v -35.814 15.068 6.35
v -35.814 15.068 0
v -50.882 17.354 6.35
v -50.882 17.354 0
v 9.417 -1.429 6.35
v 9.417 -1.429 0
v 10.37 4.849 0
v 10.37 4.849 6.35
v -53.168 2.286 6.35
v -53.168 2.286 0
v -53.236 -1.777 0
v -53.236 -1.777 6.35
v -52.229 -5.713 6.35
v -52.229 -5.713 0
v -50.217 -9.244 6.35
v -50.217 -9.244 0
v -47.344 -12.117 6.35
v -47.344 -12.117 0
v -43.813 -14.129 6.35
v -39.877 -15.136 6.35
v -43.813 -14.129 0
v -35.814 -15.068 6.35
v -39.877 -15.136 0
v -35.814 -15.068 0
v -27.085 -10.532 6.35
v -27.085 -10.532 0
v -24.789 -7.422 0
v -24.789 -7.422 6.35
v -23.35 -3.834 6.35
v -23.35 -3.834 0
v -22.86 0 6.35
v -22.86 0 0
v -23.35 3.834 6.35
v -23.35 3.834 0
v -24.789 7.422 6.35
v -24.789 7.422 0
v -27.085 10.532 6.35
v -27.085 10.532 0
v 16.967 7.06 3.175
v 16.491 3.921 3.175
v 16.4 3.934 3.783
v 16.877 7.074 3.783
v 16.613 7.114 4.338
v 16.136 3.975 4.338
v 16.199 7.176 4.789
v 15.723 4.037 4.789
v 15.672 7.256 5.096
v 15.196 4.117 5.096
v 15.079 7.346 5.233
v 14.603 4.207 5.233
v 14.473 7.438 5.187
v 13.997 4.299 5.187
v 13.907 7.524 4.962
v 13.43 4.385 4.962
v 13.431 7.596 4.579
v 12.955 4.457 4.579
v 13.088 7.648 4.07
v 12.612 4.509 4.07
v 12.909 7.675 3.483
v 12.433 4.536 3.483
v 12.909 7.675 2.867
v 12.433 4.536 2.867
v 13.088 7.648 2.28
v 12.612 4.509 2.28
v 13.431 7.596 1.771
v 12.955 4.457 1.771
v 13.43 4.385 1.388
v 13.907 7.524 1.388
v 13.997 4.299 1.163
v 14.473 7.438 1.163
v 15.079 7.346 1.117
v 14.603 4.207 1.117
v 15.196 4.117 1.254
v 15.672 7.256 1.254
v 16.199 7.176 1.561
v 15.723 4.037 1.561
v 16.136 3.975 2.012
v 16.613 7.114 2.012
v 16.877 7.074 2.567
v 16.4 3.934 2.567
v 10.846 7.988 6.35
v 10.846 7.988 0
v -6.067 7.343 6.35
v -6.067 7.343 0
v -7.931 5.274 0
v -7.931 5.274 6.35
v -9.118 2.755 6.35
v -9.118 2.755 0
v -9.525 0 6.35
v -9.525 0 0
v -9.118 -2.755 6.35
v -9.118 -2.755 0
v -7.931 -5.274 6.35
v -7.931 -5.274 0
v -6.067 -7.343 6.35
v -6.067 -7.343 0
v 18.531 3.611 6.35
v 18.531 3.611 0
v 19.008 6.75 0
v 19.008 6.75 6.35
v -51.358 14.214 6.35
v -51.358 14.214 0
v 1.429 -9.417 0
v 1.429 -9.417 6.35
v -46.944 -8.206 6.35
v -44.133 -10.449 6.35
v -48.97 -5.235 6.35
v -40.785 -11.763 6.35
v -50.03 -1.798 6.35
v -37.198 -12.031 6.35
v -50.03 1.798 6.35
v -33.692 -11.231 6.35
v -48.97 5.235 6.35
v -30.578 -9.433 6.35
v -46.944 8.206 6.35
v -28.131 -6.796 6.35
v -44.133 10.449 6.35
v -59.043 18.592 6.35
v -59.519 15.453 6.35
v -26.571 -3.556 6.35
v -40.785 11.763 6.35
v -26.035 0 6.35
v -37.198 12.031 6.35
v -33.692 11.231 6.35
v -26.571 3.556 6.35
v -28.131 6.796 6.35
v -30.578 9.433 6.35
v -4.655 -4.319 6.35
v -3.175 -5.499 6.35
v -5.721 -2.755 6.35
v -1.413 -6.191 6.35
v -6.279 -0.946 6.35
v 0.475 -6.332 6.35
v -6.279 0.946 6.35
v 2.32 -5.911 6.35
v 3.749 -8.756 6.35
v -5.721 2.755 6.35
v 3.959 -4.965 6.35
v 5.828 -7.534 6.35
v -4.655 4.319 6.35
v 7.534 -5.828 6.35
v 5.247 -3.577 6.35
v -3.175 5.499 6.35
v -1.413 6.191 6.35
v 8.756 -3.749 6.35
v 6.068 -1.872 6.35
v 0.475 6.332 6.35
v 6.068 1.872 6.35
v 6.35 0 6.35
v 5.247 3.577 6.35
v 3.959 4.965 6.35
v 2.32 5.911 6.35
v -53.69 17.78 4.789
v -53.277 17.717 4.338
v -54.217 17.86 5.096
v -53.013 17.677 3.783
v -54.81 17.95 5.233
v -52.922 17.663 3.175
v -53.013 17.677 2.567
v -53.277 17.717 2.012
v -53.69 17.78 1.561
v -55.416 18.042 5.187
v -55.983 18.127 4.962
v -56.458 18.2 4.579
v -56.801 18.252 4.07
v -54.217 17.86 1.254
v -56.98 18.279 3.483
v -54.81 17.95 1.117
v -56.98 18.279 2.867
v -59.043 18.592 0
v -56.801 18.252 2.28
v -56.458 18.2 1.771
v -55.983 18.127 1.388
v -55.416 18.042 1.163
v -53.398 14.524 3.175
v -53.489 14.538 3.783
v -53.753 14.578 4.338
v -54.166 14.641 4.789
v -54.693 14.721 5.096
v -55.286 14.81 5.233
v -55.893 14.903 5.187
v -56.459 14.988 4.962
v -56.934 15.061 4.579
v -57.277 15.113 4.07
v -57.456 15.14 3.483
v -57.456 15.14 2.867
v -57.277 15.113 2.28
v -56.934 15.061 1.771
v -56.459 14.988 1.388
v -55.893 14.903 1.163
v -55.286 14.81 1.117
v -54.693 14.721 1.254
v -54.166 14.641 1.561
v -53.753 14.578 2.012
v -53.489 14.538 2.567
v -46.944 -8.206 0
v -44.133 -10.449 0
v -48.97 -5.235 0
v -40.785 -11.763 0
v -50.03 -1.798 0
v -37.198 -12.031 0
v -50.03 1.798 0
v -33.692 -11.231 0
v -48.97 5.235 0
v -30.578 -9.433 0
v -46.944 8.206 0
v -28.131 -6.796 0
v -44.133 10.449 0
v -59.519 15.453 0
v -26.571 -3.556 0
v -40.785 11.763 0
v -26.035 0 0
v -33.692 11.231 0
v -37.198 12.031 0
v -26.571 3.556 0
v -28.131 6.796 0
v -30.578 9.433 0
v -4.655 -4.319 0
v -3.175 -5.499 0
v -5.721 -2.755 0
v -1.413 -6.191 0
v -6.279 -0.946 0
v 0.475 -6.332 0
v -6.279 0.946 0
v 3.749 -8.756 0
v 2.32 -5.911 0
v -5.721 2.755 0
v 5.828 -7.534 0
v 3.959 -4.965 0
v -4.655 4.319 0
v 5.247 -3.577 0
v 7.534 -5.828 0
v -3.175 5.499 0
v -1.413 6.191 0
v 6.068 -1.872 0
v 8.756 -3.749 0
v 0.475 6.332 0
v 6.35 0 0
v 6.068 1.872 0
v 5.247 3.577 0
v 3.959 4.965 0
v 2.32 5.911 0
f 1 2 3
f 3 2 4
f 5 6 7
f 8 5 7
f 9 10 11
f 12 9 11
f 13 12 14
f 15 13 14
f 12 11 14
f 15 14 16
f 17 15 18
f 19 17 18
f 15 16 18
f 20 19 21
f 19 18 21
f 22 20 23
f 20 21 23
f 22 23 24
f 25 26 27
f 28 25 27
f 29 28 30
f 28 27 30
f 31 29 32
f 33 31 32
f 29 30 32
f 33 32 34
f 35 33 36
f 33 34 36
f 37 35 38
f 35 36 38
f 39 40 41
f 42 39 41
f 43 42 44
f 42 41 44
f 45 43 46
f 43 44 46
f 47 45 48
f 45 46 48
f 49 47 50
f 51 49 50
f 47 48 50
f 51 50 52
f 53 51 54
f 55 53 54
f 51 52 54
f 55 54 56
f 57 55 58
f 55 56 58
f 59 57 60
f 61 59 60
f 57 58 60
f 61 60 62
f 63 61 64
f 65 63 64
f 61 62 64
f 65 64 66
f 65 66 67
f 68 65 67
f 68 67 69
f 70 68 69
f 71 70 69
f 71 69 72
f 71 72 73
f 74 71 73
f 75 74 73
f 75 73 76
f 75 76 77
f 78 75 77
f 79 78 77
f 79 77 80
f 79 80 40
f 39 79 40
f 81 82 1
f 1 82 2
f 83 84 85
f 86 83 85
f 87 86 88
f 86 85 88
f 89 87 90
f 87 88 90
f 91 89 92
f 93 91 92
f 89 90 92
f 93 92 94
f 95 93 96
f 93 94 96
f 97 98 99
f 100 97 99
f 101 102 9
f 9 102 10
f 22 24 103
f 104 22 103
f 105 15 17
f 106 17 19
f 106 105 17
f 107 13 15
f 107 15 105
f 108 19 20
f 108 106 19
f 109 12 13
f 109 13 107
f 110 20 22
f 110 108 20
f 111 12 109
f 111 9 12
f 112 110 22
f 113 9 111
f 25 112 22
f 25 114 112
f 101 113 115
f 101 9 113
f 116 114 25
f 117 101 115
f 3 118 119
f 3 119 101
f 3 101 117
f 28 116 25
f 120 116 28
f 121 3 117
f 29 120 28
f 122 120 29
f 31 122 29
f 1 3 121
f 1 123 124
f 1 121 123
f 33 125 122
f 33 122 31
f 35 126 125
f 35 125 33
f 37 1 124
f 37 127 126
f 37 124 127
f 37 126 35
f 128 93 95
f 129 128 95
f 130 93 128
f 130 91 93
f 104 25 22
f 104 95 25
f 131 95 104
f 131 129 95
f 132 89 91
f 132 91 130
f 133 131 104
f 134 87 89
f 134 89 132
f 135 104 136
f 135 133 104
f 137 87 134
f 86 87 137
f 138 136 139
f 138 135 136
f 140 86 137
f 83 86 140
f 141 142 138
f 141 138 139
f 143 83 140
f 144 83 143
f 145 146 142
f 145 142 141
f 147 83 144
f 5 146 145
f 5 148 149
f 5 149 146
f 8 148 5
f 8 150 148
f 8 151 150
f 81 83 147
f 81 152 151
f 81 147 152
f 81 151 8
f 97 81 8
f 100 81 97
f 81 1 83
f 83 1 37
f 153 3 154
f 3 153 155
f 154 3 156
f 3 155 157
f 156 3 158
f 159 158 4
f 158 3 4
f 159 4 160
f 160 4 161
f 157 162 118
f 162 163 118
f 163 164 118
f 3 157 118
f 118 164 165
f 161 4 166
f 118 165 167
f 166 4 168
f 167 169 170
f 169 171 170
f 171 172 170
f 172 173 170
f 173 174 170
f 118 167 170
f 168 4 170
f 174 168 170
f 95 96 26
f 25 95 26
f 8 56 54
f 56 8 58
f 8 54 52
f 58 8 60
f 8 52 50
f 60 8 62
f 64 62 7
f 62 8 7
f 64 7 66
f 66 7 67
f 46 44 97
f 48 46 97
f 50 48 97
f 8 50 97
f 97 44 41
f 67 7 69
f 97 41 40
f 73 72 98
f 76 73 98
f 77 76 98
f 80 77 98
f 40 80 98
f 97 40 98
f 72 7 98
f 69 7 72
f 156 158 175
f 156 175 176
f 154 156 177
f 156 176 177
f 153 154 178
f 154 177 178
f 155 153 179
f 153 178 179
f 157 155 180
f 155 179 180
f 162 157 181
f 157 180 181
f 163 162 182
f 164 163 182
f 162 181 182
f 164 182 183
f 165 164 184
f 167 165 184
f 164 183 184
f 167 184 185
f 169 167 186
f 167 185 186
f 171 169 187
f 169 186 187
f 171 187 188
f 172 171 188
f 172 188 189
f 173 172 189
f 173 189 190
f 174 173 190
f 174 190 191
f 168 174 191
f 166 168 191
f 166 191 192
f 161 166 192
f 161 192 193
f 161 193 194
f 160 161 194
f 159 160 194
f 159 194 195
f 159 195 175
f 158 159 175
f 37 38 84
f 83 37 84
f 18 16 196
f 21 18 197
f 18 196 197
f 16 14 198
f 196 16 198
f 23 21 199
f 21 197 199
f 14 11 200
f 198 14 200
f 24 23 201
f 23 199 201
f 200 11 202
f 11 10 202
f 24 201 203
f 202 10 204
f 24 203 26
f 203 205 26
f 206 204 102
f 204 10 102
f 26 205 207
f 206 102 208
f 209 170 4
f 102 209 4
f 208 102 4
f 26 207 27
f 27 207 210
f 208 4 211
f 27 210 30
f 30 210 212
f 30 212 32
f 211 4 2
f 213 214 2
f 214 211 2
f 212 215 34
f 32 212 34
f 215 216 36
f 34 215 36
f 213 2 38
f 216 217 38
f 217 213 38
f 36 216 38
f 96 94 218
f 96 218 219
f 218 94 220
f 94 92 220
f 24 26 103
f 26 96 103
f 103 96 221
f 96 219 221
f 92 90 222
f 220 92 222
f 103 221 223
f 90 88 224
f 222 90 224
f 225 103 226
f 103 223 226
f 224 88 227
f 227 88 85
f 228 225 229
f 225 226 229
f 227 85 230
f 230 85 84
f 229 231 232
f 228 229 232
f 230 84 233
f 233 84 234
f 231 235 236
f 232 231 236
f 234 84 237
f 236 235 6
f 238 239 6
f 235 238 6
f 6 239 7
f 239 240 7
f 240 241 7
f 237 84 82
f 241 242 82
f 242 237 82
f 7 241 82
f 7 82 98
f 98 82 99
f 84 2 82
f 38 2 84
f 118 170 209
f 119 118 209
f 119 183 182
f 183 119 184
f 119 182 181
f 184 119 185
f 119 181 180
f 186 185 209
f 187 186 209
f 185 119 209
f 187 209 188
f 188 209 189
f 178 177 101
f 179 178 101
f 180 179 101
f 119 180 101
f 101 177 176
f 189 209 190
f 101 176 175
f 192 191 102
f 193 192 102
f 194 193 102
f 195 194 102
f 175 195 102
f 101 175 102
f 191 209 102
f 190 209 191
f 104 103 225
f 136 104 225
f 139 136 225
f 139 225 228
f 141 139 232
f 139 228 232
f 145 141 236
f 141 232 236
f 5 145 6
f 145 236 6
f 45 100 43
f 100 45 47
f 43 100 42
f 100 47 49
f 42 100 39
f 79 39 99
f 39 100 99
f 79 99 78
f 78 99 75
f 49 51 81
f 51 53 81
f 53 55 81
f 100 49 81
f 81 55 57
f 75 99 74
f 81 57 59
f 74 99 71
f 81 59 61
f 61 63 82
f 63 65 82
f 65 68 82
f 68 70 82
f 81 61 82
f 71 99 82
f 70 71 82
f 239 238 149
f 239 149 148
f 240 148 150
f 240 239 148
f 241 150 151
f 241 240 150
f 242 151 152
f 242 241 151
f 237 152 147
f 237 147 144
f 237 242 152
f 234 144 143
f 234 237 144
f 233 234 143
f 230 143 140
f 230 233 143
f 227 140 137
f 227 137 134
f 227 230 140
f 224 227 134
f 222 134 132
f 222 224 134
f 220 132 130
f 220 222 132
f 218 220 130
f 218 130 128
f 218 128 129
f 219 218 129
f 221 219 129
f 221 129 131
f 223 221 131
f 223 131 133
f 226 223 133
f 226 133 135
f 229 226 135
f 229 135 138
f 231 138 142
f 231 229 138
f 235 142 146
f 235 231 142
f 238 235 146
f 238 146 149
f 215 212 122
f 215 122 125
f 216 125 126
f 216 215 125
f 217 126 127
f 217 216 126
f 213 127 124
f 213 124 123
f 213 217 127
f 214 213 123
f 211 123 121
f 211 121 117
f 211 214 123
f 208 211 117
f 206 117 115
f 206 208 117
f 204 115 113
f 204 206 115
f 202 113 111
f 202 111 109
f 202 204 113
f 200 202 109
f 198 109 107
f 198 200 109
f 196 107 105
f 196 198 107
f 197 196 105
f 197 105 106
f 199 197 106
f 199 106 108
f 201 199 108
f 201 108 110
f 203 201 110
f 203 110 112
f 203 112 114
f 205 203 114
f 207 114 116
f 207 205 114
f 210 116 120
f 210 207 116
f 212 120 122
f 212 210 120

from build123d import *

# Parameters (mm, degrees)
F0_R     = 12.065
F0_R_2   = 6.35
F1_DEPTH = 6.35
F2_R     = 2.06375
F3_DEPTH = 14.883615
F4_R     = 2.06375
F5_DEPTH = 14.883615


with BuildPart() as f1:
    # F0 (on Top) → F1 (new body)
    with BuildSketch(Plane.XY):
        with BuildLine():
            Line((-35.814, 15.067575), (-50.881575, 17.353575))
            Line((-50.881575, 17.353575), (-51.357825, 14.214497))
            Line((-51.357825, 14.214497), (-53.167575, 2.286))
            ThreePointArc((-53.167575, 2.286), (-47.137938, 12.27083), (-35.814, 15.067575))
        make_face()
        Polygon((-51.357825, 14.214497), (-50.881575, 17.353575), (-59.043177, 18.591825), (-59.519427, 15.452747), align=None)
        with BuildLine():
            Line((10.845984, 7.988484), (-35.814, 15.067575))
            ThreePointArc((-35.814, 15.067575), (-47.137938, 12.27083), (-53.167575, 2.286))
            ThreePointArc((-53.167575, 2.286), (-48.876307, -10.776307), (-35.814, -15.067575))
            Line((-35.814, -15.067575), (1.42875, -9.417234))
            ThreePointArc((1.42875, -9.417234), (6.735192, -6.735192), (9.417234, -1.42875))
            Line((9.417234, -1.42875), (10.369734, 4.849406))
            Line((10.369734, 4.849406), (10.845984, 7.988484))
        make_face()
        with Locations((-38.1, 0)):
            Circle(F0_R, mode=Mode.SUBTRACT)
        with BuildLine():
            Line((-27.084666, 10.531857), (-6.066692, 7.343083))
            ThreePointArc((-6.066692, 7.343083), (-9.525, 0), (-6.066692, -7.343083))
            Line((-6.066692, -7.343083), (-27.084666, -10.531857))
            ThreePointArc((-27.084666, -10.531857), (-22.86, 0), (-27.084666, 10.531857))
        make_face(mode=Mode.SUBTRACT)
        Circle(F0_R_2, mode=Mode.SUBTRACT)
        Polygon((19.007587, 6.750234), (10.845984, 7.988484), (10.369734, 4.849406), (18.531337, 3.611156), align=None)
    extrude(amount=F1_DEPTH)

    # F2 (on face) → F3 (cut, through all)
    with BuildSketch(Plane(origin=(0.9525, 6.278156, 0), x_dir=(0.988686, -0.15, 0), z_dir=(-0.15, -0.988686, 0))):
        with Locations((-57.036436, 3.175)):
            Circle(F2_R)
    extrude(amount=-F3_DEPTH, mode=Mode.SUBTRACT)

    # F4 (on face) → F5 (cut, through all)
    with BuildSketch(Plane(origin=(0.9525, 6.278156, 0), x_dir=(0.988686, -0.15, 0), z_dir=(-0.15, -0.988686, 0))):
        with Locations((13.6525, 3.175)):
            Circle(F4_R)
    extrude(amount=-F5_DEPTH, mode=Mode.SUBTRACT)


solid = f1.part
